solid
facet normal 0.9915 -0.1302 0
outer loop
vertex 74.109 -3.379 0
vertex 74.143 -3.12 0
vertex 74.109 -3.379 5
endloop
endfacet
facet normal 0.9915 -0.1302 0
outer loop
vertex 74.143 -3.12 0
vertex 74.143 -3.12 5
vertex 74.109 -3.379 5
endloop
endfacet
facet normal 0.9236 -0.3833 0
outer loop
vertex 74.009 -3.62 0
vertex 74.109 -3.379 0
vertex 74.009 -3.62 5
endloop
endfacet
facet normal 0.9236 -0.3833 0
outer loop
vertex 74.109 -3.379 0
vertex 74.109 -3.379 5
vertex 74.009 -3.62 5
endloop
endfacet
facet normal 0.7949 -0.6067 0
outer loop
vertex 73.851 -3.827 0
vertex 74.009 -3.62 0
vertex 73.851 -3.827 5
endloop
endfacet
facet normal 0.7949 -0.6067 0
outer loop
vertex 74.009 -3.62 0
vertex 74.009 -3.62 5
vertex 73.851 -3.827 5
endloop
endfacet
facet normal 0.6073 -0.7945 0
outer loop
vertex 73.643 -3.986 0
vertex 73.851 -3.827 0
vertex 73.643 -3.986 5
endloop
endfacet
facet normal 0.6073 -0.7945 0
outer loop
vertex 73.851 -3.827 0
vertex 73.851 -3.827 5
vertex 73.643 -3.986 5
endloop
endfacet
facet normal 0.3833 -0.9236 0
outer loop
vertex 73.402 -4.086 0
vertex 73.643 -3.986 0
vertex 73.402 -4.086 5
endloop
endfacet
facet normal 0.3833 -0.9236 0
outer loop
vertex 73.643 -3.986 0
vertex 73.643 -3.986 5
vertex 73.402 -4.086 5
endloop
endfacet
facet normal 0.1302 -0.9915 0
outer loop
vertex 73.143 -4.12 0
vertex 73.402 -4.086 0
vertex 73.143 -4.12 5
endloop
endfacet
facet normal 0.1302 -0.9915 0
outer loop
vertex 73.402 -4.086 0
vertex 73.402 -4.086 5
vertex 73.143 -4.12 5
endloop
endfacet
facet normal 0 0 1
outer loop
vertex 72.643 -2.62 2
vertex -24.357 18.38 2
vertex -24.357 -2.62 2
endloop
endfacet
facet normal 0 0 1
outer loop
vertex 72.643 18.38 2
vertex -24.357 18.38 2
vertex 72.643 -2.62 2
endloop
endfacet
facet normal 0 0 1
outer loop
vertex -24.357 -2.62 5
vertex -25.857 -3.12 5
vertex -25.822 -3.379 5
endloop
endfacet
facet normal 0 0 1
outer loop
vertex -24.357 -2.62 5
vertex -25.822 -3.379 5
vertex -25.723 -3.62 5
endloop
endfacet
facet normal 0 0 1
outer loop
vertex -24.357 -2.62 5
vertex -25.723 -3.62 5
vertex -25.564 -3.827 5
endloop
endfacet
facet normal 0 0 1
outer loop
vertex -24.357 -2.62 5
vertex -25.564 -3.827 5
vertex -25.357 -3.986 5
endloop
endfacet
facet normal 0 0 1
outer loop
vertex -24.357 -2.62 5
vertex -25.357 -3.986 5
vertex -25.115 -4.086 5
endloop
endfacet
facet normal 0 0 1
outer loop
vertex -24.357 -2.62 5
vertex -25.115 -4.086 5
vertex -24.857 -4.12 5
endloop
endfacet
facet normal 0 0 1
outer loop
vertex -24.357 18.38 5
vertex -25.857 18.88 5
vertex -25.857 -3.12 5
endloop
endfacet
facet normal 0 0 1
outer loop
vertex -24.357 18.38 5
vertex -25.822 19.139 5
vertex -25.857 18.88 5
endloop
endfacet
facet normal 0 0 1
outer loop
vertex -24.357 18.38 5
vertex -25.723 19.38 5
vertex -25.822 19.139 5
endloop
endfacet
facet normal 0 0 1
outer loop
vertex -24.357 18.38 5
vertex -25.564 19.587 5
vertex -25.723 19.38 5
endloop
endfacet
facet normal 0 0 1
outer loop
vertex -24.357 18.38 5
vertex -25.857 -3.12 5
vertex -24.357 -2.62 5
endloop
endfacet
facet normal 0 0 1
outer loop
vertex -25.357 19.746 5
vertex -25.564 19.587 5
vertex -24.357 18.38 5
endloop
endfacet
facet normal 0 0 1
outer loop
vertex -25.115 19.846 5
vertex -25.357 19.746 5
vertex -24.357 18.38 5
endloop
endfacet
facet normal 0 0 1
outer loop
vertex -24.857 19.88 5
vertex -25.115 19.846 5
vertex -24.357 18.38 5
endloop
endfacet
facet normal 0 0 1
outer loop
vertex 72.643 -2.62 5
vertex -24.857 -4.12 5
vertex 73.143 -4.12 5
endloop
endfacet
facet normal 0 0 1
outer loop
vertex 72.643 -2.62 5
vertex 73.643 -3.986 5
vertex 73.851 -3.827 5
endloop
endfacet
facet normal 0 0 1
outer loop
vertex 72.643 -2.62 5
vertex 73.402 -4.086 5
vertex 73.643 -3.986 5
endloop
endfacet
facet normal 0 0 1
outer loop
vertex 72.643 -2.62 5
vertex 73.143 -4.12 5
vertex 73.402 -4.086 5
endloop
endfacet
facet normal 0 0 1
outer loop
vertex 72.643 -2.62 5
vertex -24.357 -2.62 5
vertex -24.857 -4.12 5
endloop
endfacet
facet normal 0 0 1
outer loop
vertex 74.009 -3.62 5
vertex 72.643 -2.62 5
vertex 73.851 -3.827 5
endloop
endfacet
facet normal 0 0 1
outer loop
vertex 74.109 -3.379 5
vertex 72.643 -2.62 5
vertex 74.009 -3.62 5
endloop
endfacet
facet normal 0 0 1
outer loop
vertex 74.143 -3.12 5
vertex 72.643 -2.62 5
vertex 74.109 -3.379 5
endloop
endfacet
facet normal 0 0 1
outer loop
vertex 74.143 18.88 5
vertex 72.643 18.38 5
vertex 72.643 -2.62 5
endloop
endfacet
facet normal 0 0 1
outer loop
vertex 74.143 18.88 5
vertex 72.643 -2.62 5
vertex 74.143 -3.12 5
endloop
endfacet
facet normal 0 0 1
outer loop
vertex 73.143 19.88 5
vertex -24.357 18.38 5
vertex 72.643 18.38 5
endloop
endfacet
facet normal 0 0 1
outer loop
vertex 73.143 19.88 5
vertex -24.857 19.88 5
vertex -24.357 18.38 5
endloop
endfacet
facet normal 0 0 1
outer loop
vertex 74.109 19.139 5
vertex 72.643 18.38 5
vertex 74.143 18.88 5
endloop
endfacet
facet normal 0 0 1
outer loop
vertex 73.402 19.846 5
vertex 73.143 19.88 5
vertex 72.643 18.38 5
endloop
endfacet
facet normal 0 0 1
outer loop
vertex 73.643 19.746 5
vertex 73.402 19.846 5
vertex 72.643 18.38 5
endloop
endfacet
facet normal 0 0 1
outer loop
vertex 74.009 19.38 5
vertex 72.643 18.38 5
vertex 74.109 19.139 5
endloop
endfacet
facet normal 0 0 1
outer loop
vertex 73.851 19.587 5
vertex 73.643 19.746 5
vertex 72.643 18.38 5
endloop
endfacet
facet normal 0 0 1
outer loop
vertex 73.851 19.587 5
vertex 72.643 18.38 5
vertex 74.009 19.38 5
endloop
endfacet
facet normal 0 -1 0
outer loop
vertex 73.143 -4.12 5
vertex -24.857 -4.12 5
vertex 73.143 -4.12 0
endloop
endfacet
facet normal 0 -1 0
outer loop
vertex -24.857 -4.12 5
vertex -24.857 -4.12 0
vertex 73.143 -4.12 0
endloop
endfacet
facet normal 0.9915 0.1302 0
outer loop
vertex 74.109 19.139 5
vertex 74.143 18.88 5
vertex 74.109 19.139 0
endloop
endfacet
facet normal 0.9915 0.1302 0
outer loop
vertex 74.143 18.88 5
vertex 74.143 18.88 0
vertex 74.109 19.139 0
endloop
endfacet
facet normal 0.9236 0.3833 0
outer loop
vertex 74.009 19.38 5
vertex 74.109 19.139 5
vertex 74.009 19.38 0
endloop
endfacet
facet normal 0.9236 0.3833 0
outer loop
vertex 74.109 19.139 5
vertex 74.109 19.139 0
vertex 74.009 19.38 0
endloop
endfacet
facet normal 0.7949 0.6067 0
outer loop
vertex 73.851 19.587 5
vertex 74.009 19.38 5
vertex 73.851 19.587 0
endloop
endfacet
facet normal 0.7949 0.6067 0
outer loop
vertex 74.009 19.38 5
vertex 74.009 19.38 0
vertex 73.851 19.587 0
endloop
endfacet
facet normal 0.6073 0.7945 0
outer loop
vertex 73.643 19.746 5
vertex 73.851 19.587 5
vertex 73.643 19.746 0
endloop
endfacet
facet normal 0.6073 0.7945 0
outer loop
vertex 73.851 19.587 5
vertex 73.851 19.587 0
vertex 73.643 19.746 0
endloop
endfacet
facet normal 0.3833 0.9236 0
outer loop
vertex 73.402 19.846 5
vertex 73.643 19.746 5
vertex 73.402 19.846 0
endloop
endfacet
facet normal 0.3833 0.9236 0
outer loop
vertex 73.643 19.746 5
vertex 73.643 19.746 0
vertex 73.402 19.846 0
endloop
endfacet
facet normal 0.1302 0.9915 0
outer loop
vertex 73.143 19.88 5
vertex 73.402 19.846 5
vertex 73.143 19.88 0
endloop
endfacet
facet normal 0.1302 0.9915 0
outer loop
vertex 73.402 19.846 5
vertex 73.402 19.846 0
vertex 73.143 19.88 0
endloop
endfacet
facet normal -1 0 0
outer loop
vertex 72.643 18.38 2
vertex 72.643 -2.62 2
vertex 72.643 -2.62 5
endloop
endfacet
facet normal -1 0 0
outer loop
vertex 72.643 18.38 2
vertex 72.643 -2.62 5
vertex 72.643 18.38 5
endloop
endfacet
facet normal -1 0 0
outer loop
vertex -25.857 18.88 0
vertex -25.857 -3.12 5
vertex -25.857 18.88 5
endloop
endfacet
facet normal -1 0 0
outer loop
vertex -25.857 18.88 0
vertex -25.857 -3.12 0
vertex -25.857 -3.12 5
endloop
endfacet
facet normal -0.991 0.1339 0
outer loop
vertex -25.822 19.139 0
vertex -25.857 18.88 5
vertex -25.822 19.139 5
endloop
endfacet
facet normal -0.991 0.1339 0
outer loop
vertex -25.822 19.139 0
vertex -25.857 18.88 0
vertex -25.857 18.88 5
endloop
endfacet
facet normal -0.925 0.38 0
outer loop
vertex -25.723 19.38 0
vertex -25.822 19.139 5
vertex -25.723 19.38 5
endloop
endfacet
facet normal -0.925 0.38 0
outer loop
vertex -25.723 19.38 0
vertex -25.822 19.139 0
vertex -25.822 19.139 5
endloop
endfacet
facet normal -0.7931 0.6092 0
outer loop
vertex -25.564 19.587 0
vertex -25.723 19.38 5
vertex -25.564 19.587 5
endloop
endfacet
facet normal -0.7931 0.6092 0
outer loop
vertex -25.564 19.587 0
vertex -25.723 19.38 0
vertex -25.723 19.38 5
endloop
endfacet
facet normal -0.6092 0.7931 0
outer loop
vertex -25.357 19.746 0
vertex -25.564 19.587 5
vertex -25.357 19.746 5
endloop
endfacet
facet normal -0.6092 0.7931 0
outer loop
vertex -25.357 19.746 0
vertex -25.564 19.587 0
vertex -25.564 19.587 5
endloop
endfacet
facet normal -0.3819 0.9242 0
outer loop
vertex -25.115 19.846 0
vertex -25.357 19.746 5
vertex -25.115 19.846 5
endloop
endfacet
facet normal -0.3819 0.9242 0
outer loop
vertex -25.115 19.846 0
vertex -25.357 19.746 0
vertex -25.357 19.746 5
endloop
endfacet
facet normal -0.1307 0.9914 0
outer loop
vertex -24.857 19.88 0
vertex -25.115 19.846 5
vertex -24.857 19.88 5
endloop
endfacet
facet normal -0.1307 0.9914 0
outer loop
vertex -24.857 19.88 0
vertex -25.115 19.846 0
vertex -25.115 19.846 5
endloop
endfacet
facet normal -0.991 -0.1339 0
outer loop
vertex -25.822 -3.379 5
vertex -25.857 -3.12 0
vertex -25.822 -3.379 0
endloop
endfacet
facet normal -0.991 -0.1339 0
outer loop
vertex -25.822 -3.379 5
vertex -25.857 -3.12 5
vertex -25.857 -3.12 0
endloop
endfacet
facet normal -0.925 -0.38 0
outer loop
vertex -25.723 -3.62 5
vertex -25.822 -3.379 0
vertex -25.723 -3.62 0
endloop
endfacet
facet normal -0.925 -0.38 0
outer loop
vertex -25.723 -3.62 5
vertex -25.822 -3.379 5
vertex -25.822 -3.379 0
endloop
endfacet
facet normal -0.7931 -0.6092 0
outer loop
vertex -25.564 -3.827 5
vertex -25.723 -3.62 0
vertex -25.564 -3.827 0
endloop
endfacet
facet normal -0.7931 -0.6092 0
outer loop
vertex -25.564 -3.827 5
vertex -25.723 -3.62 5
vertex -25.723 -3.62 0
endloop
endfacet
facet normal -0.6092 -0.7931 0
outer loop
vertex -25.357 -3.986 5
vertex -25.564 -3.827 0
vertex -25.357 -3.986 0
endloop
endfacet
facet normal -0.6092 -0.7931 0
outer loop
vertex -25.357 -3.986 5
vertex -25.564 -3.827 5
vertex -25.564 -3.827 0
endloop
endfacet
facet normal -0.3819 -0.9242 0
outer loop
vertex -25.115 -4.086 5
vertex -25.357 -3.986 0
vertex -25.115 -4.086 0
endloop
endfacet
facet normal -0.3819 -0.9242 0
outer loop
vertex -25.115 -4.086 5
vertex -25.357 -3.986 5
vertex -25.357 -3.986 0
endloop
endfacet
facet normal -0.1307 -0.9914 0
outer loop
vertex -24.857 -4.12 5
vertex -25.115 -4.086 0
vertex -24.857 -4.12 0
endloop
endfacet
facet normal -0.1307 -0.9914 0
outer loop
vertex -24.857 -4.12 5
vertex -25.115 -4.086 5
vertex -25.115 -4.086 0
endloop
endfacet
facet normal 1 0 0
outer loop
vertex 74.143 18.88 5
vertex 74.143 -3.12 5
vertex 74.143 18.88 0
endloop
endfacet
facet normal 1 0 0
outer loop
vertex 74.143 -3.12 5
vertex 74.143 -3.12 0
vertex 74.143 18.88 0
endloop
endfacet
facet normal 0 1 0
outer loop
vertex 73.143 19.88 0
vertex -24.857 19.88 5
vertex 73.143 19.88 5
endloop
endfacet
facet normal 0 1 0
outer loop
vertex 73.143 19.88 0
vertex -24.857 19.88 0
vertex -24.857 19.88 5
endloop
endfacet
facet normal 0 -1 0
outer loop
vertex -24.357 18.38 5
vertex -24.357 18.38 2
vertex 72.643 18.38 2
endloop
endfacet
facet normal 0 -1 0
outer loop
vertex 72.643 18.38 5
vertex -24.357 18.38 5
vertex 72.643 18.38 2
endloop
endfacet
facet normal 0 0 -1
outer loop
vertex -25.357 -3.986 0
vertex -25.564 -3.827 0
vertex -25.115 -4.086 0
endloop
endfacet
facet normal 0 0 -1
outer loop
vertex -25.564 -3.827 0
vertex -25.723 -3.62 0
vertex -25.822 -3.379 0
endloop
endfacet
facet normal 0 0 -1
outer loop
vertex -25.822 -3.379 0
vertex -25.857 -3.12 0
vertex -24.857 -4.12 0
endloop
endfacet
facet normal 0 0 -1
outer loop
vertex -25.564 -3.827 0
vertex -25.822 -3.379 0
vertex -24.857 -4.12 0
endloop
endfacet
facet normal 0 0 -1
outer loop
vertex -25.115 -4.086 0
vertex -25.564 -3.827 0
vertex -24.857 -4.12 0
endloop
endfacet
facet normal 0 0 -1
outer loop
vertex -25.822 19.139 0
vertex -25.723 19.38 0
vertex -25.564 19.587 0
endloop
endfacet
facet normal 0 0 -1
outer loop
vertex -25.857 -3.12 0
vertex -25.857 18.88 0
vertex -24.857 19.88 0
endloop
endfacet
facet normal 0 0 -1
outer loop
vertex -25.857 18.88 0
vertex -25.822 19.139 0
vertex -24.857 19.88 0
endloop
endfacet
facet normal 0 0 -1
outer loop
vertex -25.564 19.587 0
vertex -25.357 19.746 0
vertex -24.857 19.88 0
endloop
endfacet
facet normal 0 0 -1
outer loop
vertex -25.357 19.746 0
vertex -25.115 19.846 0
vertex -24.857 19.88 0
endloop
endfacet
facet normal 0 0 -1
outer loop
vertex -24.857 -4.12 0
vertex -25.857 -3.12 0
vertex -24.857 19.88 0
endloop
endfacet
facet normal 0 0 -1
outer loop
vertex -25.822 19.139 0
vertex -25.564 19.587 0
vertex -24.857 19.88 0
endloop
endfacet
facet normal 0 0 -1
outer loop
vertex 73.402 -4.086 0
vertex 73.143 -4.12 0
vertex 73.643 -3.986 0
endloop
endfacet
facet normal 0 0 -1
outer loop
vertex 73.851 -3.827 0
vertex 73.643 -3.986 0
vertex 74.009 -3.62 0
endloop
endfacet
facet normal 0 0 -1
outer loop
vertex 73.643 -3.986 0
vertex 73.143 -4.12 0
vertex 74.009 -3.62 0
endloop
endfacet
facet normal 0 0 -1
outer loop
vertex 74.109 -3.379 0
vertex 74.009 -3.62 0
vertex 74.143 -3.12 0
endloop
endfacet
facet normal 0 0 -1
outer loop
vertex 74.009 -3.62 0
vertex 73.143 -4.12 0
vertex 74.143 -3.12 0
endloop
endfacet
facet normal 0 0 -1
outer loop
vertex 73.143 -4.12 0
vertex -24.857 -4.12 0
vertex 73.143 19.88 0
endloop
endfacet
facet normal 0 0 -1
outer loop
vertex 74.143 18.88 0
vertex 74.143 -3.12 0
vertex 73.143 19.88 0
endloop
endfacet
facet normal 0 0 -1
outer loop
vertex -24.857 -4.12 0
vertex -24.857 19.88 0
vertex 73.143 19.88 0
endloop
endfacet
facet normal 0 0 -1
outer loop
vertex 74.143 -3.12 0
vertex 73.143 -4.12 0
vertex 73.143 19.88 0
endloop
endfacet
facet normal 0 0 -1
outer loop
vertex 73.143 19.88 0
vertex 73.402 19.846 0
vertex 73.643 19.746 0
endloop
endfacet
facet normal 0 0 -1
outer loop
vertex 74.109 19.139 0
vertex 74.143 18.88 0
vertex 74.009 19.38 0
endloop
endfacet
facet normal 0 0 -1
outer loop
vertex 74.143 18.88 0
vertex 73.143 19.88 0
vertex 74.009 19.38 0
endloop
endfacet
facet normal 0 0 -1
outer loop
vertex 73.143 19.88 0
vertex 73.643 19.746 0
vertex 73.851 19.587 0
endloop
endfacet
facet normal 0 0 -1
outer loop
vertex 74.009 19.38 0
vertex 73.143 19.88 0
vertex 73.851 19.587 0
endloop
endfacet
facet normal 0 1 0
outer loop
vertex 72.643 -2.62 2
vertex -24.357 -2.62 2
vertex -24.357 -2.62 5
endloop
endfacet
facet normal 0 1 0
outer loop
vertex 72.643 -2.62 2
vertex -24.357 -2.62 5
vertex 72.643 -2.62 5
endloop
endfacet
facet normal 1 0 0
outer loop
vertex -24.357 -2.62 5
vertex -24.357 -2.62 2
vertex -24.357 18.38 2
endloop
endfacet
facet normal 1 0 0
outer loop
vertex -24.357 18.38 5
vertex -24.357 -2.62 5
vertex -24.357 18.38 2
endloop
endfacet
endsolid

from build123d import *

# Parameters (mm, degrees)
F0_W     = 100
F0_H     = 24
F0_W_2   = 97
F0_H_2   = 21
F1_DEPTH = 2
F2_DEPTH = 5
F3_R     = 1


with BuildPart() as f1:
    # F0 (on Top) → F1 (new body)
    with BuildSketch(Plane.XY):
        with Locations((24.1434355296, 7.8797731549)):
            Rectangle(F0_W, F0_H)
        with Locations((24.1434355296, 7.8797731549)):
            Rectangle(F0_W_2, F0_H_2, mode=Mode.SUBTRACT)
        with Locations((24.1434355296, 7.8797731549)):
            Rectangle(F0_W_2, F0_H_2)
    extrude(amount=F1_DEPTH)

    # F0 (on Top) → F2 (join)
    with BuildSketch(Plane.XY):
        with Locations((24.1434355296, 7.8797731549)):
            Rectangle(F0_W, F0_H)
        with Locations((24.1434355296, 7.8797731549)):
            Rectangle(F0_W_2, F0_H_2, mode=Mode.SUBTRACT)
    extrude(amount=F2_DEPTH)

    # F3
    f3_edges = [f1.edges().sort_by_distance(p)[0] for p in [
        (74.143436, 19.879773, 2.5),
        (74.143436, -4.120227, 2.5),
        (-25.856564, -4.120227, 2.5),
        (-25.856564, 19.879773, 2.5),
    ]]
    fillet(f3_edges, radius=F3_R)


solid = f1.part
